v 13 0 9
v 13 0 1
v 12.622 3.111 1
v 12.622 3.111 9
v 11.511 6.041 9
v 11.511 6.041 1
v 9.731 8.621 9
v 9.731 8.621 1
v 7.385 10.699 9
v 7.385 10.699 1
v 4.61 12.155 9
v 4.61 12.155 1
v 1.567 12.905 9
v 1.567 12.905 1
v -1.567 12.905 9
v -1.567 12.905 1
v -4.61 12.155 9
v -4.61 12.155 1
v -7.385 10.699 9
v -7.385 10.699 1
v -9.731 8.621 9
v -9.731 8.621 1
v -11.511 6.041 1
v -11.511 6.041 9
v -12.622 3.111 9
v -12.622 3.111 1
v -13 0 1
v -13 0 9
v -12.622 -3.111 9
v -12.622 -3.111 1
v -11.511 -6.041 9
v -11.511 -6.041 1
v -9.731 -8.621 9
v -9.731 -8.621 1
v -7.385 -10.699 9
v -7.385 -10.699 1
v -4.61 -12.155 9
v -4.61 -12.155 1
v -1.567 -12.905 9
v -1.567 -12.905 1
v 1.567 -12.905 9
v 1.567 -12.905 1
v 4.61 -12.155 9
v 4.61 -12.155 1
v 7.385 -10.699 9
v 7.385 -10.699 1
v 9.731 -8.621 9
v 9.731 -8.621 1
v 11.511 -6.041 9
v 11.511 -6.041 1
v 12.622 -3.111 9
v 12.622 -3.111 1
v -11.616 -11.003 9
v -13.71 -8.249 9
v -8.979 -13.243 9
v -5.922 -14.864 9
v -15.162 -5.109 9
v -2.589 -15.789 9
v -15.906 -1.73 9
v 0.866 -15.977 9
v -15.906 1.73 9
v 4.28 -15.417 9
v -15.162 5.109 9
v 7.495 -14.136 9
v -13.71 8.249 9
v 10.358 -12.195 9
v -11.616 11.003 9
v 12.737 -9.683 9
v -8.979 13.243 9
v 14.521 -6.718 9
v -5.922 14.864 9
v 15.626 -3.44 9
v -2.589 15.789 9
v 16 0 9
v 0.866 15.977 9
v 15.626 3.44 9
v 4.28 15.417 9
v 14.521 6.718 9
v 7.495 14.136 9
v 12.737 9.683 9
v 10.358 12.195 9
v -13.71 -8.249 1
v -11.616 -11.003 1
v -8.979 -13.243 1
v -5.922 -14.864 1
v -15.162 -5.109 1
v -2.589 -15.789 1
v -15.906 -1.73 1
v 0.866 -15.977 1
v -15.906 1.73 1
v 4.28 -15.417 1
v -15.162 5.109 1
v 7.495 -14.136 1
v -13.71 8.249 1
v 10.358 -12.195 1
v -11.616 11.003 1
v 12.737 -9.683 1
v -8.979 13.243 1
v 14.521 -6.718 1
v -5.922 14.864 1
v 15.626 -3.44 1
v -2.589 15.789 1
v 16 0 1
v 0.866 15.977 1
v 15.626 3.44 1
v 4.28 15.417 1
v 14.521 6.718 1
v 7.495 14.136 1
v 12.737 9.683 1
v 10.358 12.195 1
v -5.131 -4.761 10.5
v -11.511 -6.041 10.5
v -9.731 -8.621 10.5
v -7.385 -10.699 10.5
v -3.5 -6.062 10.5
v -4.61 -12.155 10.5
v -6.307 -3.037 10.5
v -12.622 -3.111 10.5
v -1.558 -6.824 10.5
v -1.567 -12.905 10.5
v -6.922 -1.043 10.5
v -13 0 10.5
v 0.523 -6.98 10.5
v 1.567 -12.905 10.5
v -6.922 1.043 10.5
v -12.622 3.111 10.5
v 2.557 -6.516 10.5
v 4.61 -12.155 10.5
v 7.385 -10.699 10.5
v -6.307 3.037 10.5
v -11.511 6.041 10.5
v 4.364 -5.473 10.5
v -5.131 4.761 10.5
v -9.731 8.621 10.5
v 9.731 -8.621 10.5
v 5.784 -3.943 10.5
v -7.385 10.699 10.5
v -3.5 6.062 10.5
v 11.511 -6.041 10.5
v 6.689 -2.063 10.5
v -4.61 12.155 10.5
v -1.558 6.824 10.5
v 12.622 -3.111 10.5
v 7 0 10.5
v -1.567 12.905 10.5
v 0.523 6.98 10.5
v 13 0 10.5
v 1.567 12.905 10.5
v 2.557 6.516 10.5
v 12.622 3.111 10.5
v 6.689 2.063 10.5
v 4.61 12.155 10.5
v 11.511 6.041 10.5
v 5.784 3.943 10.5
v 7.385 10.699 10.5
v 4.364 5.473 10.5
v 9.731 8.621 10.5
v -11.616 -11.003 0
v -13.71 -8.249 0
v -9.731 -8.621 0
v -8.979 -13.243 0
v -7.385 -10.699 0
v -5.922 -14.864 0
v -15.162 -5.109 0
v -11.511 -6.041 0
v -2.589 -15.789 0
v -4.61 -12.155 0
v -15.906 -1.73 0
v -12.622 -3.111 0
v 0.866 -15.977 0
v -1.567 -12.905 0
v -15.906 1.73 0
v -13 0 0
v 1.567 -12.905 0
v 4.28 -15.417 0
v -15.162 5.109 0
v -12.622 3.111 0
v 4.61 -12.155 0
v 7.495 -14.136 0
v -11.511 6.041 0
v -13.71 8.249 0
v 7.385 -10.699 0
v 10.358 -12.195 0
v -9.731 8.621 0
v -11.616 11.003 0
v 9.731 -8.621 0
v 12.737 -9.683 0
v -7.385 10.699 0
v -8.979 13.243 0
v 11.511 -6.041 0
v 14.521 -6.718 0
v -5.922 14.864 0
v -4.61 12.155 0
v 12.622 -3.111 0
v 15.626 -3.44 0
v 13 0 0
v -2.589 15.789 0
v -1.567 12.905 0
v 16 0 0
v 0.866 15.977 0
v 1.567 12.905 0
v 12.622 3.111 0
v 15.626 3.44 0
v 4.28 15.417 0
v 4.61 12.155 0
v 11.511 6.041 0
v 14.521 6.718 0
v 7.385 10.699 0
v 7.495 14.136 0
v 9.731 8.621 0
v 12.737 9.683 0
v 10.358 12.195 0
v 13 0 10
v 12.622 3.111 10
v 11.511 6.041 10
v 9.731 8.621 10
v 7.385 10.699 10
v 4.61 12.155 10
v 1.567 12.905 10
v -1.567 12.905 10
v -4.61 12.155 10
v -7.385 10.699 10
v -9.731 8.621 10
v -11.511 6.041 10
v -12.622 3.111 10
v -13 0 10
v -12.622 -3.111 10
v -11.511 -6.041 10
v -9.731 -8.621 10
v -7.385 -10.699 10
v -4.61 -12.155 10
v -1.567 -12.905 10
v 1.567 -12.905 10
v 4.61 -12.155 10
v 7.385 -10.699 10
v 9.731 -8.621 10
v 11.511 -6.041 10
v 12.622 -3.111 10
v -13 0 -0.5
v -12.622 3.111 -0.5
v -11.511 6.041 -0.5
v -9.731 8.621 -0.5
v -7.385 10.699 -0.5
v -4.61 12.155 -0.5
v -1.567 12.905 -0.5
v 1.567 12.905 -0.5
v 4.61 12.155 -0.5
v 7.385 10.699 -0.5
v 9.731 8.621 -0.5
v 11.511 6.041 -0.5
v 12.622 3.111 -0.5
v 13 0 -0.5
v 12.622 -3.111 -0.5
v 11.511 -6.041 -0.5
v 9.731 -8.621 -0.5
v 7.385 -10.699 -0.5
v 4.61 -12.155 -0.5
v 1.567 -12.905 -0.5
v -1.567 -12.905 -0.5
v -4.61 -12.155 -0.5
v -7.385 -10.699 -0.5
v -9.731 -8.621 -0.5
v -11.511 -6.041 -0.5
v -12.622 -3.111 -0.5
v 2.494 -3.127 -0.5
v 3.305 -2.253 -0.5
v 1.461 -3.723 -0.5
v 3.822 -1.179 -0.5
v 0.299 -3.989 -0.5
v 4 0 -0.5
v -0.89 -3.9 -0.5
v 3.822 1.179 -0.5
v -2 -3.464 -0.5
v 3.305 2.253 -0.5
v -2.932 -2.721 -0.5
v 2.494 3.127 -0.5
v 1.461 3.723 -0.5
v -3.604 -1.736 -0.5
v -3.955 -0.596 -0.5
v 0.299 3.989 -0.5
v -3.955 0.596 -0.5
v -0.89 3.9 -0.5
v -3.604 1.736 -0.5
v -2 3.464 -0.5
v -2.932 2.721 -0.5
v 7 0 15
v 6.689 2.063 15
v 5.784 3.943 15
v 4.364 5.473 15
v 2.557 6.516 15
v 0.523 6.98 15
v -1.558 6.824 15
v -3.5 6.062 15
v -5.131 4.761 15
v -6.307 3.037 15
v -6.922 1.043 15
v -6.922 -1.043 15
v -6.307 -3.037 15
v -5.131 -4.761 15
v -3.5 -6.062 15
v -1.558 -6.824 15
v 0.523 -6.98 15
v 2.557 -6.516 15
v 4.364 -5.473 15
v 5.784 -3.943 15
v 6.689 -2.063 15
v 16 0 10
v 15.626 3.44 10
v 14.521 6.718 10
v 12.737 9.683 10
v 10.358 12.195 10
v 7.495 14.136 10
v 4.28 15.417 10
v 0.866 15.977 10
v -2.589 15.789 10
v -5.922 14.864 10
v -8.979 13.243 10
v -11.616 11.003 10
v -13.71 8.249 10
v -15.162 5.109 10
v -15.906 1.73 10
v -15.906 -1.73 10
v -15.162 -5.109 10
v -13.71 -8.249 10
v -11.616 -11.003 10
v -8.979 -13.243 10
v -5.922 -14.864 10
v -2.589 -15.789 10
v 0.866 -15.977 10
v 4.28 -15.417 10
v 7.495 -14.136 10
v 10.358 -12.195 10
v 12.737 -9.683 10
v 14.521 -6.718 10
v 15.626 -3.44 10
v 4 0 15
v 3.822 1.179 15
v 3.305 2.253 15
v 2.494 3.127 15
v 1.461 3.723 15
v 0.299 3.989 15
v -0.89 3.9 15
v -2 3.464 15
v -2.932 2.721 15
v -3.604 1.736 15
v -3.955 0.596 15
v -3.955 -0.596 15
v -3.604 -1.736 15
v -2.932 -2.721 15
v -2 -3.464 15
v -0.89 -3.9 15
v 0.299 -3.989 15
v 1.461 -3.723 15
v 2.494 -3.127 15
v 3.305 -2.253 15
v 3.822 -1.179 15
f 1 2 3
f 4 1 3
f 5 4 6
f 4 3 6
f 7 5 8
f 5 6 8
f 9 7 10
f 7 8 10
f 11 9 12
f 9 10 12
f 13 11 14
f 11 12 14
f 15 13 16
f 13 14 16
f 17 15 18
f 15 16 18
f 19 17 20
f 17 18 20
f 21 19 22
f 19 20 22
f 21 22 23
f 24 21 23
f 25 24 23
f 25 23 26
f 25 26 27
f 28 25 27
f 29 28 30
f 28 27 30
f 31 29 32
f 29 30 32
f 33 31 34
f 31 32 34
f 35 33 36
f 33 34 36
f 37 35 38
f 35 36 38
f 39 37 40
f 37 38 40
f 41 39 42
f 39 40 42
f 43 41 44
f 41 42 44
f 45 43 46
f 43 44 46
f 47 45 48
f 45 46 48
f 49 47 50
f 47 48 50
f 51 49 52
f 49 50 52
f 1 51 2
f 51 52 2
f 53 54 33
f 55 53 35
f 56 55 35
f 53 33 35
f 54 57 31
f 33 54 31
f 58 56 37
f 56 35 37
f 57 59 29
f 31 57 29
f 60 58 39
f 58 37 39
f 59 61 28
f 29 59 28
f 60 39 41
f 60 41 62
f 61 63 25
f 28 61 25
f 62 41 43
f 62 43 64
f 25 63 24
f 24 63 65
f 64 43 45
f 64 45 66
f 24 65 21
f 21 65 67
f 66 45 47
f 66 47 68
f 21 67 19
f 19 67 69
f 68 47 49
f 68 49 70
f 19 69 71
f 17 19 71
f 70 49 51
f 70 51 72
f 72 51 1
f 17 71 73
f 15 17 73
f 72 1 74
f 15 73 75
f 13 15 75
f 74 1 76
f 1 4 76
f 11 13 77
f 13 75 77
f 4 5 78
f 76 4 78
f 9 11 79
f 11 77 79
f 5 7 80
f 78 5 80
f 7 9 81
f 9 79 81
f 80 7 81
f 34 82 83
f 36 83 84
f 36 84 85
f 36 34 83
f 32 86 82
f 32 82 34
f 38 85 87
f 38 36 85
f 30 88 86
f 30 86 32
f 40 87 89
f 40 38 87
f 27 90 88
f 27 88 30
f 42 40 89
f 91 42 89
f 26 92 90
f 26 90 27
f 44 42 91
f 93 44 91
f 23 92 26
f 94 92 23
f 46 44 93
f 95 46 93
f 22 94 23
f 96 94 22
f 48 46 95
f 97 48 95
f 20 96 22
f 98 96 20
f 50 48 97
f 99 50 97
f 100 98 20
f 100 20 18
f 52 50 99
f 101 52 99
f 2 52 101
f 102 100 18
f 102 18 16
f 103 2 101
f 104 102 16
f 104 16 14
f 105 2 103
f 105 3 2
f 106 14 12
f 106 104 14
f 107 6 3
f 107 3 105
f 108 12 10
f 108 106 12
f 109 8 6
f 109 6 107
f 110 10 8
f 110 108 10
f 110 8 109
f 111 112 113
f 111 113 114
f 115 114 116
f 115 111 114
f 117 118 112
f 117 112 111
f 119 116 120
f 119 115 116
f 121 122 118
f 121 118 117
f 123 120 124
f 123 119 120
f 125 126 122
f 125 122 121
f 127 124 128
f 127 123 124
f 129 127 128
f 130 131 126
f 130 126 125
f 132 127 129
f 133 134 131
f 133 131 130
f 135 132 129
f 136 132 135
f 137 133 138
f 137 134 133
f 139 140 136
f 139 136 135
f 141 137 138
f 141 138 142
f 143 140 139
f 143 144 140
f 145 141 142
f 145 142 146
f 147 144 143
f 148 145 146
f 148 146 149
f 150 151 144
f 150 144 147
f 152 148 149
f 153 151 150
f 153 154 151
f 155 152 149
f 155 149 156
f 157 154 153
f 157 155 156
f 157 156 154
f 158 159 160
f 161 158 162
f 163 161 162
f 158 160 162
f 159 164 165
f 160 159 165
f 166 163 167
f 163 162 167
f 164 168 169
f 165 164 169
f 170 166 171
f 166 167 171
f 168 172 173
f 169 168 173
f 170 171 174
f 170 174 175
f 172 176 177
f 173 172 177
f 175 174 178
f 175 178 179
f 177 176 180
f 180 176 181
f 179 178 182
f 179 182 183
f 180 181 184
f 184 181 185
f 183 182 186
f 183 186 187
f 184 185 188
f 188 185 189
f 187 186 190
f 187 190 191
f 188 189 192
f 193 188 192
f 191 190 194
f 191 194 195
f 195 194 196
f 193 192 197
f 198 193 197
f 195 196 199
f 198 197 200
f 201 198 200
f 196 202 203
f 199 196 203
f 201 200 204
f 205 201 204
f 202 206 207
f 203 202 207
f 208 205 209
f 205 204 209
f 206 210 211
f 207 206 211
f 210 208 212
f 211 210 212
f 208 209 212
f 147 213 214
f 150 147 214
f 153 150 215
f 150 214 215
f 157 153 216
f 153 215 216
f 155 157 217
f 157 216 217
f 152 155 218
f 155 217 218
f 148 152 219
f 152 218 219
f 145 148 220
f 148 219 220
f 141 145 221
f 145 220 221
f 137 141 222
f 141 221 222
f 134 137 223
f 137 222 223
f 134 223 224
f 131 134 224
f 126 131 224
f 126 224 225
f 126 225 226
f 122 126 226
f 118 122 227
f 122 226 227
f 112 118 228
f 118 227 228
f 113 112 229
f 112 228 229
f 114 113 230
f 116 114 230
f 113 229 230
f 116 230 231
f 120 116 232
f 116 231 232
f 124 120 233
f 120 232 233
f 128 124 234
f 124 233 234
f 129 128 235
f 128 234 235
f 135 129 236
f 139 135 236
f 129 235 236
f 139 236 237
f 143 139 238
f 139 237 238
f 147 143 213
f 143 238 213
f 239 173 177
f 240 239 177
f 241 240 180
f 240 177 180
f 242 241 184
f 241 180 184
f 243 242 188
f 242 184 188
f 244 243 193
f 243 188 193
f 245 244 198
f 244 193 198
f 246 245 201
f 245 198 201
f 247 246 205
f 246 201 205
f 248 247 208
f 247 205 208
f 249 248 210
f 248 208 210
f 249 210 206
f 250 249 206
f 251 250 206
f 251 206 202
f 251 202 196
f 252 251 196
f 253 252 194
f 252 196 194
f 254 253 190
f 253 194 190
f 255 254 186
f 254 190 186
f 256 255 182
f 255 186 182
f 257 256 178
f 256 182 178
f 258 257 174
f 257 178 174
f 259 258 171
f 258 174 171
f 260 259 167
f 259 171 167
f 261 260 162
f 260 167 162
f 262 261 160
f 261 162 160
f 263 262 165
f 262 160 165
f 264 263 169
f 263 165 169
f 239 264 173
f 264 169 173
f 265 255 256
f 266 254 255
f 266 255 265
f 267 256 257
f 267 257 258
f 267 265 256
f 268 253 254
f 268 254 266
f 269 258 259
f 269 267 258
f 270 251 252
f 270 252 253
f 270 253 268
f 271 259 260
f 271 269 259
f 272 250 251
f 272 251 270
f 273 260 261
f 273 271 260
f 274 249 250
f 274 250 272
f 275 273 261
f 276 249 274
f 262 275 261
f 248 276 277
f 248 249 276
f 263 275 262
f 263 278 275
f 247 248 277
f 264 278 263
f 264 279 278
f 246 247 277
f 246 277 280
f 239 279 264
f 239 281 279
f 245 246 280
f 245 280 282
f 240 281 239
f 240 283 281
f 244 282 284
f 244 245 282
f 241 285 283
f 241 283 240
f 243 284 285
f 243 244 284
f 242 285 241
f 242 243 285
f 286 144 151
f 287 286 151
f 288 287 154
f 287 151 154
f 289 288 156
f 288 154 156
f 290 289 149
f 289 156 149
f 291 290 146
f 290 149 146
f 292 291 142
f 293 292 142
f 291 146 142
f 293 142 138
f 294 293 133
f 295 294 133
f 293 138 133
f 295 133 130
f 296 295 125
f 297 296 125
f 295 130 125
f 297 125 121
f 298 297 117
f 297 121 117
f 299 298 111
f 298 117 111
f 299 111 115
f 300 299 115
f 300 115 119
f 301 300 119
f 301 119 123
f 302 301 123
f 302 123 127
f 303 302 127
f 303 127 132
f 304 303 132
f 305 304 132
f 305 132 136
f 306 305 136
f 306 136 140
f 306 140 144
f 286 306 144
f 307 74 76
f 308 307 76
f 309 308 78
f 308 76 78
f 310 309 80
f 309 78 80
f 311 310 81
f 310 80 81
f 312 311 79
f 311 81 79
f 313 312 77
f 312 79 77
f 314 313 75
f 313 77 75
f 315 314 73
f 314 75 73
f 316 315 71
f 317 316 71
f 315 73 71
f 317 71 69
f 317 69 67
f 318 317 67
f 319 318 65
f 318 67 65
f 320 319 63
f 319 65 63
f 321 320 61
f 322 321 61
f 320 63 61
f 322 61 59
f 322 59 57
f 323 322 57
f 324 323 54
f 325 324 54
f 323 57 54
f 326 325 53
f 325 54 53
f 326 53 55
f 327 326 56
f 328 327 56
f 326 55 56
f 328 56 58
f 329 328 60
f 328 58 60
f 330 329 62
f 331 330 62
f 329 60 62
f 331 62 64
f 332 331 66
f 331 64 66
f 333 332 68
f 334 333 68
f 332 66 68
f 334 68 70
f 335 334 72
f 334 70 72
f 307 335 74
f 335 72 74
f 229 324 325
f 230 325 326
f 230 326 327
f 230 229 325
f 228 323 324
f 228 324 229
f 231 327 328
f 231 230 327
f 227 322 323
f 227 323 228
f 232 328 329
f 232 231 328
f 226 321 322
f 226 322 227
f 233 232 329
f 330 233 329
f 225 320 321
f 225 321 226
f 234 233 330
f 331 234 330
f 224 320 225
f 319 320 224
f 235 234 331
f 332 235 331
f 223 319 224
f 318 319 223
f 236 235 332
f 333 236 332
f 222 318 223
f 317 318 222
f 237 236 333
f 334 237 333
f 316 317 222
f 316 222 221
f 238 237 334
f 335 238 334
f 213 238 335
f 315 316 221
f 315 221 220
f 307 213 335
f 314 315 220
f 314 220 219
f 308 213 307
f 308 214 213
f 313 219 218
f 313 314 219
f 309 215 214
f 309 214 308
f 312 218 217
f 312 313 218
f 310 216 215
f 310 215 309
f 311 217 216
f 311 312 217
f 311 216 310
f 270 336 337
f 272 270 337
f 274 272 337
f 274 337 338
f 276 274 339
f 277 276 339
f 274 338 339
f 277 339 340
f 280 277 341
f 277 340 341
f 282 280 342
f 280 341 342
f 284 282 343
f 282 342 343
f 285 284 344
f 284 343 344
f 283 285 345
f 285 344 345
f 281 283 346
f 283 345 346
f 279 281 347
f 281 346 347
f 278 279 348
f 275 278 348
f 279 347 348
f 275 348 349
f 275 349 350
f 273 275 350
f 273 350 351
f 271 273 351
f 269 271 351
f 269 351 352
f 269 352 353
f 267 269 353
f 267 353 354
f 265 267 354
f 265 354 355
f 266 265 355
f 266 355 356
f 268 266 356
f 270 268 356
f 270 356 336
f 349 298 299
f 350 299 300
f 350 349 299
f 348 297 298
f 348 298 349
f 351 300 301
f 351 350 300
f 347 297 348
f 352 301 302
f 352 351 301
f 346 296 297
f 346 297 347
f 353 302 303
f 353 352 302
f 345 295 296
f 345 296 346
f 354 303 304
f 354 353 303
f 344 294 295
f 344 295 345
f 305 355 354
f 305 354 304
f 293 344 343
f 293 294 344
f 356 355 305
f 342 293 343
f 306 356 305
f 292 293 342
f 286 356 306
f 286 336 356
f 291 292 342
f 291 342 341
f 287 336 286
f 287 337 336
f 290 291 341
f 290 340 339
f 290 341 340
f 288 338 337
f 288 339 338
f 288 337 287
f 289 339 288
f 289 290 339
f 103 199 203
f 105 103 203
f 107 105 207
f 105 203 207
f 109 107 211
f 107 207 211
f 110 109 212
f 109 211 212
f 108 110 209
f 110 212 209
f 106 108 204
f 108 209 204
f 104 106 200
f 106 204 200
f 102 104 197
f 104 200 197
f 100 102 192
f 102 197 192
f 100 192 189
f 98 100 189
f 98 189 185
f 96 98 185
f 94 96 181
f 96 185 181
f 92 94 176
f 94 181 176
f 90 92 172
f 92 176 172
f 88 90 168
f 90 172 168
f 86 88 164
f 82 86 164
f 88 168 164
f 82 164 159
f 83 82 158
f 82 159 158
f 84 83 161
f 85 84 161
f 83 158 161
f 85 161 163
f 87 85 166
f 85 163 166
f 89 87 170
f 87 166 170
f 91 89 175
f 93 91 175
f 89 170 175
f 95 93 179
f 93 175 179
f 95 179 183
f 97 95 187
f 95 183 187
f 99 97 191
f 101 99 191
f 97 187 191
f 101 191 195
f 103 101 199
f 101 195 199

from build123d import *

# Parameters (mm, degrees)
ESQUISSE1_R             = 16
BOSS_EXTRU_1_DEPTH      = 1
ESQUISSE2_R             = 13
BOSS_EXTRU_2_DEPTH      = 8
ESQUISSE3_R             = 16
BOSS_EXTRU_3_DEPTH      = 1
ESQUISSE4_R             = 7
BOSS_EXTRU_4_DEPTH      = 5
ESQUISSE6_R             = 13
BOSS_EXTRU_5_DEPTH      = 0.5
ESQUISSE7_R             = 13
BOSS_EXTRU_6_DEPTH      = 0.5
ESQUISSE8_R             = 4
ENL_V_MAT_EXTRU_2_DEPTH = 16


with BuildPart() as part:
    # Esquisse1 → Boss.-Extru.1 (new body)
    with BuildSketch(Plane.XY):
        Circle(ESQUISSE1_R)
    extrude(amount=BOSS_EXTRU_1_DEPTH)

    # Esquisse2 → Boss.-Extru.2 (add)
    with BuildSketch(Plane.XY.offset(1)):
        Circle(ESQUISSE2_R)
    extrude(amount=BOSS_EXTRU_2_DEPTH)

    # Esquisse3 → Boss.-Extru.3 (add)
    with BuildSketch(Plane.XY.offset(9)):
        Circle(ESQUISSE3_R)
    extrude(amount=BOSS_EXTRU_3_DEPTH)

    # Esquisse4 → Boss.-Extru.4 (add)
    with BuildSketch(Plane.XY.offset(10)):
        Circle(ESQUISSE4_R)
    extrude(amount=BOSS_EXTRU_4_DEPTH)

    # Esquisse6 → Boss.-Extru.5 (add)
    with BuildSketch(Plane.XY.offset(10)):
        Circle(ESQUISSE6_R)
    extrude(amount=BOSS_EXTRU_5_DEPTH)

    # Esquisse7 → Boss.-Extru.6 (add)
    with BuildSketch(Plane(origin=(0, 0, 0), x_dir=(-1, 0, 0), z_dir=(0, 0, -1))):
        Circle(ESQUISSE7_R)
    extrude(amount=BOSS_EXTRU_6_DEPTH)

    # Esquisse8 → Enlèv. mat.-Extru.2 (cut)
    with BuildSketch(Plane.XY.offset(15)):
        Circle(ESQUISSE8_R)
    extrude(amount=-ENL_V_MAT_EXTRU_2_DEPTH, mode=Mode.SUBTRACT)


solid = part.part
